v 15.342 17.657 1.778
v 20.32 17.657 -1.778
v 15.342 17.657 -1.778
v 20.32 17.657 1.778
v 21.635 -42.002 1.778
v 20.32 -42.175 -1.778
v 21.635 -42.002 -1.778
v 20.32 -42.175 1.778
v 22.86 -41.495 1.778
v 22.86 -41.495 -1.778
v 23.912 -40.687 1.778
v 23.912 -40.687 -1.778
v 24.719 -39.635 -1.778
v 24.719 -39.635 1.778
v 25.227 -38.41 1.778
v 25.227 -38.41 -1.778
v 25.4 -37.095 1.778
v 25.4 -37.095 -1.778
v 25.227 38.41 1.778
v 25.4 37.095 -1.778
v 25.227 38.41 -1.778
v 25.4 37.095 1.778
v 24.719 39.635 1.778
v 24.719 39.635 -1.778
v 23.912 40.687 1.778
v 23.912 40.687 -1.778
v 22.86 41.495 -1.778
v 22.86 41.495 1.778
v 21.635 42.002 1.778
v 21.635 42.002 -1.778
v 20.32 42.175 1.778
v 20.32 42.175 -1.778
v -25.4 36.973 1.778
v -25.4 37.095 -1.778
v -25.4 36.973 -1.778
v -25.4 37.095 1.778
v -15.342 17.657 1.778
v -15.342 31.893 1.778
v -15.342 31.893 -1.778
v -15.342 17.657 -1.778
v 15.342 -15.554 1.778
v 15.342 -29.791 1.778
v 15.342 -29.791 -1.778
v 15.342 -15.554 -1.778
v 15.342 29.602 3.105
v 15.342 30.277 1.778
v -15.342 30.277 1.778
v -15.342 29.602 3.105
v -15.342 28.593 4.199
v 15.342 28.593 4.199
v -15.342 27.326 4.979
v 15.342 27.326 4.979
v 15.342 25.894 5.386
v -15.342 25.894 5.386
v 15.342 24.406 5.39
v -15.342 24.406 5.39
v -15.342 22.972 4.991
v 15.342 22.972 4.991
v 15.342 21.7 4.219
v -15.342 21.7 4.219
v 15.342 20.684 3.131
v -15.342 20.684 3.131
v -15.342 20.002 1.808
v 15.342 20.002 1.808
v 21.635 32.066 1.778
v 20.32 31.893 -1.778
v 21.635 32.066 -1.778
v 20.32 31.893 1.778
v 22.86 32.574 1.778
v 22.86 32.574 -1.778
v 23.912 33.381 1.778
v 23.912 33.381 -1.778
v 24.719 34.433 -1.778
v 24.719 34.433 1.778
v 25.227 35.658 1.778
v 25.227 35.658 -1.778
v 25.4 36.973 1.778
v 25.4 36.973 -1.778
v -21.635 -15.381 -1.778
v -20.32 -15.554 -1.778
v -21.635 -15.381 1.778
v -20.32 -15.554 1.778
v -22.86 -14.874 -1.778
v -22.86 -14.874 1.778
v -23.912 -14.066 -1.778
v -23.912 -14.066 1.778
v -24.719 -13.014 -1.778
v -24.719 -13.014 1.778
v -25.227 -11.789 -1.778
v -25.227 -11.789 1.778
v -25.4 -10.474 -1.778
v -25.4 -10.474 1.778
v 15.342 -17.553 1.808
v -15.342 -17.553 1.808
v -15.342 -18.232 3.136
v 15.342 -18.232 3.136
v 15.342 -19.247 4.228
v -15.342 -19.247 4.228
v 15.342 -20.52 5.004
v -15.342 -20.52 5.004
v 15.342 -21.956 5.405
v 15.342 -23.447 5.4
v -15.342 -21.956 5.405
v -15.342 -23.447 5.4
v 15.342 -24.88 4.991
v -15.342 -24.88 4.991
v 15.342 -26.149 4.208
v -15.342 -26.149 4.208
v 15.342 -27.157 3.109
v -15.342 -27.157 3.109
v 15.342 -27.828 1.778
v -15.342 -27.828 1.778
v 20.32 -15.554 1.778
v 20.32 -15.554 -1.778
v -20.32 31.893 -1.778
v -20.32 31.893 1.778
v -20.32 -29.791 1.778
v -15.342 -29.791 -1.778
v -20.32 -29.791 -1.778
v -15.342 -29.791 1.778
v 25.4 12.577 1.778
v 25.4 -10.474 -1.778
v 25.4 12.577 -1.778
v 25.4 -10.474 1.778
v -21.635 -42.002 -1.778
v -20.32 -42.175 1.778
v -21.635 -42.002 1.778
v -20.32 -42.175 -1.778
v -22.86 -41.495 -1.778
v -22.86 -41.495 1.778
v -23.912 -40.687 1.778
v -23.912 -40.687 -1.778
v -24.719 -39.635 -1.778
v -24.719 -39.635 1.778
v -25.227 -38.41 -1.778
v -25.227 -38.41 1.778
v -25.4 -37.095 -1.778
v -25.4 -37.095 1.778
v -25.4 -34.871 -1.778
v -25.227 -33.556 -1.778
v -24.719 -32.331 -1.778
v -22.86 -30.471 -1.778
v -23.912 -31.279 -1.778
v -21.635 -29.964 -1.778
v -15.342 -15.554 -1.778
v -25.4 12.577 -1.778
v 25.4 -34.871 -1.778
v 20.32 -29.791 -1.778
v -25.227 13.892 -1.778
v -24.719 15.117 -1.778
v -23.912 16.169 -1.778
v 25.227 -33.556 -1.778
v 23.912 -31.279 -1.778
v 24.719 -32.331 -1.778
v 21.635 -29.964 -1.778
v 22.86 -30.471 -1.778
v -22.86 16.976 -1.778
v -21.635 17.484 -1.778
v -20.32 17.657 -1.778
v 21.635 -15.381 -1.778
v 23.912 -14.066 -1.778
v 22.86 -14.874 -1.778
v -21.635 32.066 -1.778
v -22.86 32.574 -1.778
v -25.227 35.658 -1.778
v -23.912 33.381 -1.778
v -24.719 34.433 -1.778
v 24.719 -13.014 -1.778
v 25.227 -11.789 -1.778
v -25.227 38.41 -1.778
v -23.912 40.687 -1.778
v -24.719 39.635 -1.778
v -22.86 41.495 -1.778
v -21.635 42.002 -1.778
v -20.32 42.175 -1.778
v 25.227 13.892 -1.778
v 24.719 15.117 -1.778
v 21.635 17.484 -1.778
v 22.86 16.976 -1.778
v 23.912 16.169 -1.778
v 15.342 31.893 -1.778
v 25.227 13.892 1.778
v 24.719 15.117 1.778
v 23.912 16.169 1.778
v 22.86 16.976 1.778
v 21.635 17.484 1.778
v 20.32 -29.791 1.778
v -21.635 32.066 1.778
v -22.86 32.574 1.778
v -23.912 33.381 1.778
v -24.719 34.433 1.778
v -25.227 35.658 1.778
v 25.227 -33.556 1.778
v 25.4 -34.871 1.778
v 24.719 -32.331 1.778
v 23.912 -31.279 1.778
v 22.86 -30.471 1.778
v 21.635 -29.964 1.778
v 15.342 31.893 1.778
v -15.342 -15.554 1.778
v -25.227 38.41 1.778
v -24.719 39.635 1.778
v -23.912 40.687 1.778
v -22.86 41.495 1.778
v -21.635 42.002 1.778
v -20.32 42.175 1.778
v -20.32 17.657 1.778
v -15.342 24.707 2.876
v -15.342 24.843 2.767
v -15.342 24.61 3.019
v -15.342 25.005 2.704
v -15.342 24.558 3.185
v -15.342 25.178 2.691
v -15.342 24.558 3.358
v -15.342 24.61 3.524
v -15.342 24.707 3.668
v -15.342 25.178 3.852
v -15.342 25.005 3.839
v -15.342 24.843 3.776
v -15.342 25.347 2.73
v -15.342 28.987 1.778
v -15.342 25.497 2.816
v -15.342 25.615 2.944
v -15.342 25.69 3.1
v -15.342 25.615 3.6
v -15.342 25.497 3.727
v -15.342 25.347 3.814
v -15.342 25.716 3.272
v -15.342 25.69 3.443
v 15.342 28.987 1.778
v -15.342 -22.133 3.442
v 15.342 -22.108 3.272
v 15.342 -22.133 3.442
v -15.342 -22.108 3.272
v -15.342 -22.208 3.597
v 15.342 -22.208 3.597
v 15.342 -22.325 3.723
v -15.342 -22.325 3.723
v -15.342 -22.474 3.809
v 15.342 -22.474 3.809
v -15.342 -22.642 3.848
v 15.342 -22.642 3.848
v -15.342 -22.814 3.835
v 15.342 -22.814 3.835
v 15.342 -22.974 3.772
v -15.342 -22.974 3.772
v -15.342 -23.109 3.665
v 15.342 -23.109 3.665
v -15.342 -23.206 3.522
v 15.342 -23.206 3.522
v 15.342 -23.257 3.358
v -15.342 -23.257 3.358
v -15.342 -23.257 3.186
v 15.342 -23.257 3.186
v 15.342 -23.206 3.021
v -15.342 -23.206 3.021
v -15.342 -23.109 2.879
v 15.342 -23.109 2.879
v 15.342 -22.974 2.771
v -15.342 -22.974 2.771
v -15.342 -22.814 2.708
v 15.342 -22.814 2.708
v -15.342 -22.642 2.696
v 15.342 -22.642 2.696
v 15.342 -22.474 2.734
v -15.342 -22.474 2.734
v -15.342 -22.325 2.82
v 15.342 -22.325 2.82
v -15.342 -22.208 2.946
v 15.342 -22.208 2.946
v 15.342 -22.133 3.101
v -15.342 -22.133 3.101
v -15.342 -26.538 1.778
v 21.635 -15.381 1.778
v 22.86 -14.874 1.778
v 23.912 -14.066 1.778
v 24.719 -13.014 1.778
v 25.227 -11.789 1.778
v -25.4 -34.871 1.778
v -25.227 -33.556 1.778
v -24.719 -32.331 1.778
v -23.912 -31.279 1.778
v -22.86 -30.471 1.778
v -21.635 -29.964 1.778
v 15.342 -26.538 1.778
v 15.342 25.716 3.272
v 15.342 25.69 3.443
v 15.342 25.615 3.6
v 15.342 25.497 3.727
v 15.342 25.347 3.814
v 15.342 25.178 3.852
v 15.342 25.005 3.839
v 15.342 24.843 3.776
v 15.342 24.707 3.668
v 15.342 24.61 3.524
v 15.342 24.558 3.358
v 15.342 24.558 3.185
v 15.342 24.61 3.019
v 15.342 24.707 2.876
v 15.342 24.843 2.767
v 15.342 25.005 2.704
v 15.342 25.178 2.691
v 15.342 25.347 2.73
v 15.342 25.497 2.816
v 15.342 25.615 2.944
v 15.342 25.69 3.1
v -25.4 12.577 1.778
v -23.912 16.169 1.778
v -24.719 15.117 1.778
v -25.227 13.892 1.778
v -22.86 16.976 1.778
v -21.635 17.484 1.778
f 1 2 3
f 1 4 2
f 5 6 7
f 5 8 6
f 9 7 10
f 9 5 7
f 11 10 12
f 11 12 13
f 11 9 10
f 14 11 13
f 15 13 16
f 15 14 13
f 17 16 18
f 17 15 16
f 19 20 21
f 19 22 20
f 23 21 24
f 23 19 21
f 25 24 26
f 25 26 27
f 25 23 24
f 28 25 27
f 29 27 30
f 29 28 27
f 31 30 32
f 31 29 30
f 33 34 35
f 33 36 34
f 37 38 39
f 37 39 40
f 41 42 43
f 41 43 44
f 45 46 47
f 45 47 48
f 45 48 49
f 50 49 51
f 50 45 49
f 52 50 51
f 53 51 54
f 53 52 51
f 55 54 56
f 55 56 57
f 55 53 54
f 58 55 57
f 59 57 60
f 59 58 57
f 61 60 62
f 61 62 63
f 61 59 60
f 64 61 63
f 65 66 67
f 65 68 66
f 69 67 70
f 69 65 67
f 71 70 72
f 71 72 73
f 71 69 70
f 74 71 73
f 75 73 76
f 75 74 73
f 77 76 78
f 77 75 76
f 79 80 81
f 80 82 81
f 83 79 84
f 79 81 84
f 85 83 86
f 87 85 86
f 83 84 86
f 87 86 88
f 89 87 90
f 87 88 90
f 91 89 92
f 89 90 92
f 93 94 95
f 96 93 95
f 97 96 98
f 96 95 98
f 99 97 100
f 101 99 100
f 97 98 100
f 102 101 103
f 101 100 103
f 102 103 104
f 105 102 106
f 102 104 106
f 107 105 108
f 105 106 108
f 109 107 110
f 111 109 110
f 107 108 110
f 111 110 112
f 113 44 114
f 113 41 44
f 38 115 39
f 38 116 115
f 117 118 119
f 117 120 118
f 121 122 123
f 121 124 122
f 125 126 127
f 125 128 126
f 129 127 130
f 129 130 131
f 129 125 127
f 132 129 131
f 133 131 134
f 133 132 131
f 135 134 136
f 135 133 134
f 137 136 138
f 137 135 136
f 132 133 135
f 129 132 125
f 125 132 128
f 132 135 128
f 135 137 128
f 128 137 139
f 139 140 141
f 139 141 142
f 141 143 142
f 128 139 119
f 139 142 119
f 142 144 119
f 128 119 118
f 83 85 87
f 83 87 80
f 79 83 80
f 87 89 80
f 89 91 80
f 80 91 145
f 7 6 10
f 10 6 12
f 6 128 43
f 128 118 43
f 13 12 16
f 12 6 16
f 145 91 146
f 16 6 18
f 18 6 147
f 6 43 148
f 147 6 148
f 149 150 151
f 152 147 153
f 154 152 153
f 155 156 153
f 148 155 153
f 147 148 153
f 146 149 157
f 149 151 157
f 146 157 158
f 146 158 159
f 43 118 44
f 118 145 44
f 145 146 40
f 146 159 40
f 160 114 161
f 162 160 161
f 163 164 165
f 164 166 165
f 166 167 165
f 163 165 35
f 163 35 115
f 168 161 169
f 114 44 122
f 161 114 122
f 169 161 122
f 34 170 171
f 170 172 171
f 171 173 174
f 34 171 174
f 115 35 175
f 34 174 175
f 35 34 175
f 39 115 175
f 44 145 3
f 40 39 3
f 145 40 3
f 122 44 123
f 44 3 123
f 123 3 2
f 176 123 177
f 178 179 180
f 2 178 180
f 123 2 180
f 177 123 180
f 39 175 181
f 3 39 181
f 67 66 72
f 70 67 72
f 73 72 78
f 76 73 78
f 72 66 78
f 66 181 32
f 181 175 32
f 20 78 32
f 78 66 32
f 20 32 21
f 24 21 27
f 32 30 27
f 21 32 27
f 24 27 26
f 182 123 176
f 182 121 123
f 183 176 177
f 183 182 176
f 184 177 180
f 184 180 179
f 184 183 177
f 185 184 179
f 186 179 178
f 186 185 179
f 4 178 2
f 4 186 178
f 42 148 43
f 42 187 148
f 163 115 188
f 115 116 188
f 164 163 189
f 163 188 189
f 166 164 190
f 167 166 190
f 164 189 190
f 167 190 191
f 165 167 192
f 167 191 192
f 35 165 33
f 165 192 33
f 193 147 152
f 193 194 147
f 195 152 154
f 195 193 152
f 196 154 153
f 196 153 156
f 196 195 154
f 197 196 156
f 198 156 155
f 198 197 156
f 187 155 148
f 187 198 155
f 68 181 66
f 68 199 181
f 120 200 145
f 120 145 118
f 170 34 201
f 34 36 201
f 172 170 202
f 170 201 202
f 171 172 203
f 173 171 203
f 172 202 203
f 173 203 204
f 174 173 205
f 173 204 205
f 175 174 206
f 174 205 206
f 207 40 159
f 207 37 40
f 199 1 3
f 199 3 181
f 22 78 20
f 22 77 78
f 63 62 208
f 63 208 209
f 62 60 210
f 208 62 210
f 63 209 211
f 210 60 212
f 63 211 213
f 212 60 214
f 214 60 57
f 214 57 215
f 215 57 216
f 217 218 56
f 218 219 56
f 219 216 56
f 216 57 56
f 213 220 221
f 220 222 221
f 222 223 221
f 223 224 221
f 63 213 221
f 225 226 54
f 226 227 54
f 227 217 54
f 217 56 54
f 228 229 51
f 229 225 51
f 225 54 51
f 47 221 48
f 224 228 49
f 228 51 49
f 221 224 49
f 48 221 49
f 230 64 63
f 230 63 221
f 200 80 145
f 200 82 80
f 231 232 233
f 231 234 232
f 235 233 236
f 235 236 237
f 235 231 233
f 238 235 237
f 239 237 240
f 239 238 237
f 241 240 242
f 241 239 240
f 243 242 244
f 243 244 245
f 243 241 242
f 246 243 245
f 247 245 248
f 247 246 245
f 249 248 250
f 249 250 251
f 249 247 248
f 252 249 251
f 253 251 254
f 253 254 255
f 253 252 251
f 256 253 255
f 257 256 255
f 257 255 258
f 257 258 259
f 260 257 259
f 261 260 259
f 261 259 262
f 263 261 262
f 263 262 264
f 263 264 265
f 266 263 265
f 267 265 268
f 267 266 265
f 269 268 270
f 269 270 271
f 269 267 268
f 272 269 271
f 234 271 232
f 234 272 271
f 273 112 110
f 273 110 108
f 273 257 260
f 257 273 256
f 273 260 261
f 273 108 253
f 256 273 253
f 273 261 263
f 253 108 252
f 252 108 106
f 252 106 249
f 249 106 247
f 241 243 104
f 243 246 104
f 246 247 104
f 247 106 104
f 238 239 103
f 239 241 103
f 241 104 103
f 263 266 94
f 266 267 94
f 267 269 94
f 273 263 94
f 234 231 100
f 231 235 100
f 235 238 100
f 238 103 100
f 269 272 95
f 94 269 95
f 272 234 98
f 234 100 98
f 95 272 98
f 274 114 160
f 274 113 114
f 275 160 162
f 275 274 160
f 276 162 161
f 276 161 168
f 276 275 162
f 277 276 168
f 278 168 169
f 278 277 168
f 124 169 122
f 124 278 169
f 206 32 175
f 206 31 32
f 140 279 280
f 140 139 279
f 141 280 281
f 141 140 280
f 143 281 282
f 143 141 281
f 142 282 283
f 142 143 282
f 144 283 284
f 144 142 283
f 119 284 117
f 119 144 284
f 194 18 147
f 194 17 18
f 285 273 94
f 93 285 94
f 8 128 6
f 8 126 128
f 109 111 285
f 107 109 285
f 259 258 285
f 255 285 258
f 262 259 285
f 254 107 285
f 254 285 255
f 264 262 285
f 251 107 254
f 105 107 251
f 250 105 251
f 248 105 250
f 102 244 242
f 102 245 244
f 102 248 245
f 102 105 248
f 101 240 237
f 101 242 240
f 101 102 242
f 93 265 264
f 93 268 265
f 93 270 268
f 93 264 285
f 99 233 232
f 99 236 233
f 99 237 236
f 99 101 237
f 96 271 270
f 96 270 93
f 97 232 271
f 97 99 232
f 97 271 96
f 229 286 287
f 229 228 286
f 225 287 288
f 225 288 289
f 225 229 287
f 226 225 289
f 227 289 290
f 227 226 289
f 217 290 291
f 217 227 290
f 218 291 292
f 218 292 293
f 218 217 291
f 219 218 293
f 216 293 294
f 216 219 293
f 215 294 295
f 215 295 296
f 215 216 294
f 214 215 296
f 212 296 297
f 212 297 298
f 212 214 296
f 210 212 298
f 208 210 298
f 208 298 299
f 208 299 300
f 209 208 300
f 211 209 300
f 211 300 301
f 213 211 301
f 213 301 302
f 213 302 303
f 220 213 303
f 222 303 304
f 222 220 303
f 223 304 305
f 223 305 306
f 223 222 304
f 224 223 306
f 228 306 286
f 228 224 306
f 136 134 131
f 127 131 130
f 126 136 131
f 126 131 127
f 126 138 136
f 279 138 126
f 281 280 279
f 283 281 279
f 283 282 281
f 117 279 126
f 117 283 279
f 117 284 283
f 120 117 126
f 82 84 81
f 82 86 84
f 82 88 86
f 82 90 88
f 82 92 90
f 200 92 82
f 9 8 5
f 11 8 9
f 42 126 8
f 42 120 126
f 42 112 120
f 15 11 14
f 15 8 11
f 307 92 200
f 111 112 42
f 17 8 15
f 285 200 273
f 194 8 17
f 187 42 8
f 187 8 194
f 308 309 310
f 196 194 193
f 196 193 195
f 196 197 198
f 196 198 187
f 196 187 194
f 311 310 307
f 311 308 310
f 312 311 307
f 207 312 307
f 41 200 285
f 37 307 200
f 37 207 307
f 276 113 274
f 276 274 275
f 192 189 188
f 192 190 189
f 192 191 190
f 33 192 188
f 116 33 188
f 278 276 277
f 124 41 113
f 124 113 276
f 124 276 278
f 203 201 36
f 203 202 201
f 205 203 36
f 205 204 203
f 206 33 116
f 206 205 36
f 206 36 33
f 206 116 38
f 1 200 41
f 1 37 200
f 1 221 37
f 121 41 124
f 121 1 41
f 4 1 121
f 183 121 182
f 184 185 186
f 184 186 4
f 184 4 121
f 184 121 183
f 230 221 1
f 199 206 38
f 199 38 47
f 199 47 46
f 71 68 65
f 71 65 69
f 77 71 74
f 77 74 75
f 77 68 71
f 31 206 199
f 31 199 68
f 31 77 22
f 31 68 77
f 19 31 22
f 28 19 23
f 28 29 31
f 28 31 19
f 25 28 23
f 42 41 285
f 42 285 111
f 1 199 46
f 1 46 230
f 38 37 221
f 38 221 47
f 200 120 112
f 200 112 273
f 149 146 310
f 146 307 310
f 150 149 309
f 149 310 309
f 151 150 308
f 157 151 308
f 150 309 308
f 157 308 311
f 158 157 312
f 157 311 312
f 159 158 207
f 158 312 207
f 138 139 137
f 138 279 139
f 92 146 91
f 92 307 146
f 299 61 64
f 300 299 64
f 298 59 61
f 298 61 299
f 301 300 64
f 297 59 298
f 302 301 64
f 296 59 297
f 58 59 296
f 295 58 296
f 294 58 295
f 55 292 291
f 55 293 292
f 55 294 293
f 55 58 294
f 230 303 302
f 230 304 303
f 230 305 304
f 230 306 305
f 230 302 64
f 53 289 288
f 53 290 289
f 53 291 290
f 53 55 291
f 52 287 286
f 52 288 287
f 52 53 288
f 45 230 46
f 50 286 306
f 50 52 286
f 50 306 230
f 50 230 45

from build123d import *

# Parameters (mm, degrees)
F1_DEPTH = 1.778
F2_R     = 0.577688
F2_R_2   = 0.582255
F3_DEPTH = 15.3416
F4_R     = 5.08


with BuildPart() as f1:
    # F0 (on Top) → F1 (new body, symmetric)
    with BuildSketch(Plane.XY):
        Polygon((-25.4, -42.175161), (25.4, -42.175161), (25.4, -29.790713), (15.341625, -29.790713), (15.341625, -15.554283), (25.4, -15.554283), (25.4, 17.656827), (15.341625, 17.656827), (15.341625, 31.893248), (25.4, 31.893248), (25.4, 42.175161), (-25.4, 42.175161), (-25.4, 31.893248), (-15.341633, 31.893248), (-15.341633, 17.65682), (-25.4, 17.65682), (-25.4, -15.554283), (-15.341625, -15.554283), (-15.341625, -29.790713), (-25.4, -29.790713), align=None)
    extrude(amount=F1_DEPTH, both=True)

    # F2 (on Right) → F3 (join, symmetric)
    with BuildSketch(Plane.YZ):
        with BuildLine():
            Line((-27.829766, 1.773621), (-17.552791, 1.808458))
            ThreePointArc((-17.552791, 1.808458), (-22.703696, 5.454035), (-27.829766, 1.773621))
        make_face()
        with Locations((-22.68527, 3.27162)):
            Circle(F2_R, mode=Mode.SUBTRACT)
        with BuildLine():
            Line((20.001708, 1.808458), (30.278683, 1.773621))
            ThreePointArc((30.278683, 1.773621), (25.152562, 5.439228), (20.001708, 1.808458))
        make_face()
        with Locations((25.134111, 3.27162)):
            Circle(F2_R_2, mode=Mode.SUBTRACT)
    extrude(amount=F3_DEPTH, both=True)

    # F4
    f4_edges = [f1.edges().sort_by_distance(p)[0] for p in [
        (25.4, -42.175161, 0),
        (-25.4, -42.175161, 0),
        (-25.4, -29.790713, 0),
        (-25.4, -15.554283, 0),
        (-25.4, 17.65682, 0),
        (-25.4, 31.893248, 0),
        (-25.4, 42.175161, 0),
        (25.4, 42.175161, 0),
        (25.4, 17.656827, 0),
        (25.4, 31.893248, 0),
        (25.4, -29.790713, 0),
        (25.4, -15.554283, 0),
    ]]
    fillet(f4_edges, radius=F4_R)


solid = f1.part
